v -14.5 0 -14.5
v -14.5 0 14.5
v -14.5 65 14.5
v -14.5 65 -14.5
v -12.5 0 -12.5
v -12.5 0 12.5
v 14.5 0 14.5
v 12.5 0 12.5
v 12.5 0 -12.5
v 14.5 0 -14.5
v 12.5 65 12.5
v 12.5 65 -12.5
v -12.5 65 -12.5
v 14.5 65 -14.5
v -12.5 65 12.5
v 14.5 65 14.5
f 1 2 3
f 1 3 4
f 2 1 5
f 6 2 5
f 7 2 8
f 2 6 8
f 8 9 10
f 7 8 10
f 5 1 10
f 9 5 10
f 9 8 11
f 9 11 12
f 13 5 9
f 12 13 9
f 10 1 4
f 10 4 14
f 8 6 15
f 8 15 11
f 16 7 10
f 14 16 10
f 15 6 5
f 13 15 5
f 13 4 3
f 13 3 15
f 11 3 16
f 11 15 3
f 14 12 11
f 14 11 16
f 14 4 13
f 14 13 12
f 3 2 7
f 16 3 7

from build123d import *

# Parameters (mm, degrees)
SKETCH_1_W      = 29
SKETCH_1_H      = 29
EXTRUDE_1_DEPTH = 65
SHELL_1_T       = -2


with BuildPart() as part:
    # Эскиз1 → Бобышка-Вытянуть1 (new body)
    with BuildSketch(Plane(origin=(0, 0, 0), x_dir=(1, 0, 0), z_dir=(0, 1, 0))):
        Rectangle(SKETCH_1_W, SKETCH_1_H)
    extrude(amount=EXTRUDE_1_DEPTH)

    # Оболочка1
    shell_1_openings = [part.faces().sort_by_distance(p)[0] for p in [
        (0, 65, 0),
        (0, 0, 0),
    ]]
    offset(amount=SHELL_1_T, openings=shell_1_openings, kind=Kind.INTERSECTION)


solid = part.part
